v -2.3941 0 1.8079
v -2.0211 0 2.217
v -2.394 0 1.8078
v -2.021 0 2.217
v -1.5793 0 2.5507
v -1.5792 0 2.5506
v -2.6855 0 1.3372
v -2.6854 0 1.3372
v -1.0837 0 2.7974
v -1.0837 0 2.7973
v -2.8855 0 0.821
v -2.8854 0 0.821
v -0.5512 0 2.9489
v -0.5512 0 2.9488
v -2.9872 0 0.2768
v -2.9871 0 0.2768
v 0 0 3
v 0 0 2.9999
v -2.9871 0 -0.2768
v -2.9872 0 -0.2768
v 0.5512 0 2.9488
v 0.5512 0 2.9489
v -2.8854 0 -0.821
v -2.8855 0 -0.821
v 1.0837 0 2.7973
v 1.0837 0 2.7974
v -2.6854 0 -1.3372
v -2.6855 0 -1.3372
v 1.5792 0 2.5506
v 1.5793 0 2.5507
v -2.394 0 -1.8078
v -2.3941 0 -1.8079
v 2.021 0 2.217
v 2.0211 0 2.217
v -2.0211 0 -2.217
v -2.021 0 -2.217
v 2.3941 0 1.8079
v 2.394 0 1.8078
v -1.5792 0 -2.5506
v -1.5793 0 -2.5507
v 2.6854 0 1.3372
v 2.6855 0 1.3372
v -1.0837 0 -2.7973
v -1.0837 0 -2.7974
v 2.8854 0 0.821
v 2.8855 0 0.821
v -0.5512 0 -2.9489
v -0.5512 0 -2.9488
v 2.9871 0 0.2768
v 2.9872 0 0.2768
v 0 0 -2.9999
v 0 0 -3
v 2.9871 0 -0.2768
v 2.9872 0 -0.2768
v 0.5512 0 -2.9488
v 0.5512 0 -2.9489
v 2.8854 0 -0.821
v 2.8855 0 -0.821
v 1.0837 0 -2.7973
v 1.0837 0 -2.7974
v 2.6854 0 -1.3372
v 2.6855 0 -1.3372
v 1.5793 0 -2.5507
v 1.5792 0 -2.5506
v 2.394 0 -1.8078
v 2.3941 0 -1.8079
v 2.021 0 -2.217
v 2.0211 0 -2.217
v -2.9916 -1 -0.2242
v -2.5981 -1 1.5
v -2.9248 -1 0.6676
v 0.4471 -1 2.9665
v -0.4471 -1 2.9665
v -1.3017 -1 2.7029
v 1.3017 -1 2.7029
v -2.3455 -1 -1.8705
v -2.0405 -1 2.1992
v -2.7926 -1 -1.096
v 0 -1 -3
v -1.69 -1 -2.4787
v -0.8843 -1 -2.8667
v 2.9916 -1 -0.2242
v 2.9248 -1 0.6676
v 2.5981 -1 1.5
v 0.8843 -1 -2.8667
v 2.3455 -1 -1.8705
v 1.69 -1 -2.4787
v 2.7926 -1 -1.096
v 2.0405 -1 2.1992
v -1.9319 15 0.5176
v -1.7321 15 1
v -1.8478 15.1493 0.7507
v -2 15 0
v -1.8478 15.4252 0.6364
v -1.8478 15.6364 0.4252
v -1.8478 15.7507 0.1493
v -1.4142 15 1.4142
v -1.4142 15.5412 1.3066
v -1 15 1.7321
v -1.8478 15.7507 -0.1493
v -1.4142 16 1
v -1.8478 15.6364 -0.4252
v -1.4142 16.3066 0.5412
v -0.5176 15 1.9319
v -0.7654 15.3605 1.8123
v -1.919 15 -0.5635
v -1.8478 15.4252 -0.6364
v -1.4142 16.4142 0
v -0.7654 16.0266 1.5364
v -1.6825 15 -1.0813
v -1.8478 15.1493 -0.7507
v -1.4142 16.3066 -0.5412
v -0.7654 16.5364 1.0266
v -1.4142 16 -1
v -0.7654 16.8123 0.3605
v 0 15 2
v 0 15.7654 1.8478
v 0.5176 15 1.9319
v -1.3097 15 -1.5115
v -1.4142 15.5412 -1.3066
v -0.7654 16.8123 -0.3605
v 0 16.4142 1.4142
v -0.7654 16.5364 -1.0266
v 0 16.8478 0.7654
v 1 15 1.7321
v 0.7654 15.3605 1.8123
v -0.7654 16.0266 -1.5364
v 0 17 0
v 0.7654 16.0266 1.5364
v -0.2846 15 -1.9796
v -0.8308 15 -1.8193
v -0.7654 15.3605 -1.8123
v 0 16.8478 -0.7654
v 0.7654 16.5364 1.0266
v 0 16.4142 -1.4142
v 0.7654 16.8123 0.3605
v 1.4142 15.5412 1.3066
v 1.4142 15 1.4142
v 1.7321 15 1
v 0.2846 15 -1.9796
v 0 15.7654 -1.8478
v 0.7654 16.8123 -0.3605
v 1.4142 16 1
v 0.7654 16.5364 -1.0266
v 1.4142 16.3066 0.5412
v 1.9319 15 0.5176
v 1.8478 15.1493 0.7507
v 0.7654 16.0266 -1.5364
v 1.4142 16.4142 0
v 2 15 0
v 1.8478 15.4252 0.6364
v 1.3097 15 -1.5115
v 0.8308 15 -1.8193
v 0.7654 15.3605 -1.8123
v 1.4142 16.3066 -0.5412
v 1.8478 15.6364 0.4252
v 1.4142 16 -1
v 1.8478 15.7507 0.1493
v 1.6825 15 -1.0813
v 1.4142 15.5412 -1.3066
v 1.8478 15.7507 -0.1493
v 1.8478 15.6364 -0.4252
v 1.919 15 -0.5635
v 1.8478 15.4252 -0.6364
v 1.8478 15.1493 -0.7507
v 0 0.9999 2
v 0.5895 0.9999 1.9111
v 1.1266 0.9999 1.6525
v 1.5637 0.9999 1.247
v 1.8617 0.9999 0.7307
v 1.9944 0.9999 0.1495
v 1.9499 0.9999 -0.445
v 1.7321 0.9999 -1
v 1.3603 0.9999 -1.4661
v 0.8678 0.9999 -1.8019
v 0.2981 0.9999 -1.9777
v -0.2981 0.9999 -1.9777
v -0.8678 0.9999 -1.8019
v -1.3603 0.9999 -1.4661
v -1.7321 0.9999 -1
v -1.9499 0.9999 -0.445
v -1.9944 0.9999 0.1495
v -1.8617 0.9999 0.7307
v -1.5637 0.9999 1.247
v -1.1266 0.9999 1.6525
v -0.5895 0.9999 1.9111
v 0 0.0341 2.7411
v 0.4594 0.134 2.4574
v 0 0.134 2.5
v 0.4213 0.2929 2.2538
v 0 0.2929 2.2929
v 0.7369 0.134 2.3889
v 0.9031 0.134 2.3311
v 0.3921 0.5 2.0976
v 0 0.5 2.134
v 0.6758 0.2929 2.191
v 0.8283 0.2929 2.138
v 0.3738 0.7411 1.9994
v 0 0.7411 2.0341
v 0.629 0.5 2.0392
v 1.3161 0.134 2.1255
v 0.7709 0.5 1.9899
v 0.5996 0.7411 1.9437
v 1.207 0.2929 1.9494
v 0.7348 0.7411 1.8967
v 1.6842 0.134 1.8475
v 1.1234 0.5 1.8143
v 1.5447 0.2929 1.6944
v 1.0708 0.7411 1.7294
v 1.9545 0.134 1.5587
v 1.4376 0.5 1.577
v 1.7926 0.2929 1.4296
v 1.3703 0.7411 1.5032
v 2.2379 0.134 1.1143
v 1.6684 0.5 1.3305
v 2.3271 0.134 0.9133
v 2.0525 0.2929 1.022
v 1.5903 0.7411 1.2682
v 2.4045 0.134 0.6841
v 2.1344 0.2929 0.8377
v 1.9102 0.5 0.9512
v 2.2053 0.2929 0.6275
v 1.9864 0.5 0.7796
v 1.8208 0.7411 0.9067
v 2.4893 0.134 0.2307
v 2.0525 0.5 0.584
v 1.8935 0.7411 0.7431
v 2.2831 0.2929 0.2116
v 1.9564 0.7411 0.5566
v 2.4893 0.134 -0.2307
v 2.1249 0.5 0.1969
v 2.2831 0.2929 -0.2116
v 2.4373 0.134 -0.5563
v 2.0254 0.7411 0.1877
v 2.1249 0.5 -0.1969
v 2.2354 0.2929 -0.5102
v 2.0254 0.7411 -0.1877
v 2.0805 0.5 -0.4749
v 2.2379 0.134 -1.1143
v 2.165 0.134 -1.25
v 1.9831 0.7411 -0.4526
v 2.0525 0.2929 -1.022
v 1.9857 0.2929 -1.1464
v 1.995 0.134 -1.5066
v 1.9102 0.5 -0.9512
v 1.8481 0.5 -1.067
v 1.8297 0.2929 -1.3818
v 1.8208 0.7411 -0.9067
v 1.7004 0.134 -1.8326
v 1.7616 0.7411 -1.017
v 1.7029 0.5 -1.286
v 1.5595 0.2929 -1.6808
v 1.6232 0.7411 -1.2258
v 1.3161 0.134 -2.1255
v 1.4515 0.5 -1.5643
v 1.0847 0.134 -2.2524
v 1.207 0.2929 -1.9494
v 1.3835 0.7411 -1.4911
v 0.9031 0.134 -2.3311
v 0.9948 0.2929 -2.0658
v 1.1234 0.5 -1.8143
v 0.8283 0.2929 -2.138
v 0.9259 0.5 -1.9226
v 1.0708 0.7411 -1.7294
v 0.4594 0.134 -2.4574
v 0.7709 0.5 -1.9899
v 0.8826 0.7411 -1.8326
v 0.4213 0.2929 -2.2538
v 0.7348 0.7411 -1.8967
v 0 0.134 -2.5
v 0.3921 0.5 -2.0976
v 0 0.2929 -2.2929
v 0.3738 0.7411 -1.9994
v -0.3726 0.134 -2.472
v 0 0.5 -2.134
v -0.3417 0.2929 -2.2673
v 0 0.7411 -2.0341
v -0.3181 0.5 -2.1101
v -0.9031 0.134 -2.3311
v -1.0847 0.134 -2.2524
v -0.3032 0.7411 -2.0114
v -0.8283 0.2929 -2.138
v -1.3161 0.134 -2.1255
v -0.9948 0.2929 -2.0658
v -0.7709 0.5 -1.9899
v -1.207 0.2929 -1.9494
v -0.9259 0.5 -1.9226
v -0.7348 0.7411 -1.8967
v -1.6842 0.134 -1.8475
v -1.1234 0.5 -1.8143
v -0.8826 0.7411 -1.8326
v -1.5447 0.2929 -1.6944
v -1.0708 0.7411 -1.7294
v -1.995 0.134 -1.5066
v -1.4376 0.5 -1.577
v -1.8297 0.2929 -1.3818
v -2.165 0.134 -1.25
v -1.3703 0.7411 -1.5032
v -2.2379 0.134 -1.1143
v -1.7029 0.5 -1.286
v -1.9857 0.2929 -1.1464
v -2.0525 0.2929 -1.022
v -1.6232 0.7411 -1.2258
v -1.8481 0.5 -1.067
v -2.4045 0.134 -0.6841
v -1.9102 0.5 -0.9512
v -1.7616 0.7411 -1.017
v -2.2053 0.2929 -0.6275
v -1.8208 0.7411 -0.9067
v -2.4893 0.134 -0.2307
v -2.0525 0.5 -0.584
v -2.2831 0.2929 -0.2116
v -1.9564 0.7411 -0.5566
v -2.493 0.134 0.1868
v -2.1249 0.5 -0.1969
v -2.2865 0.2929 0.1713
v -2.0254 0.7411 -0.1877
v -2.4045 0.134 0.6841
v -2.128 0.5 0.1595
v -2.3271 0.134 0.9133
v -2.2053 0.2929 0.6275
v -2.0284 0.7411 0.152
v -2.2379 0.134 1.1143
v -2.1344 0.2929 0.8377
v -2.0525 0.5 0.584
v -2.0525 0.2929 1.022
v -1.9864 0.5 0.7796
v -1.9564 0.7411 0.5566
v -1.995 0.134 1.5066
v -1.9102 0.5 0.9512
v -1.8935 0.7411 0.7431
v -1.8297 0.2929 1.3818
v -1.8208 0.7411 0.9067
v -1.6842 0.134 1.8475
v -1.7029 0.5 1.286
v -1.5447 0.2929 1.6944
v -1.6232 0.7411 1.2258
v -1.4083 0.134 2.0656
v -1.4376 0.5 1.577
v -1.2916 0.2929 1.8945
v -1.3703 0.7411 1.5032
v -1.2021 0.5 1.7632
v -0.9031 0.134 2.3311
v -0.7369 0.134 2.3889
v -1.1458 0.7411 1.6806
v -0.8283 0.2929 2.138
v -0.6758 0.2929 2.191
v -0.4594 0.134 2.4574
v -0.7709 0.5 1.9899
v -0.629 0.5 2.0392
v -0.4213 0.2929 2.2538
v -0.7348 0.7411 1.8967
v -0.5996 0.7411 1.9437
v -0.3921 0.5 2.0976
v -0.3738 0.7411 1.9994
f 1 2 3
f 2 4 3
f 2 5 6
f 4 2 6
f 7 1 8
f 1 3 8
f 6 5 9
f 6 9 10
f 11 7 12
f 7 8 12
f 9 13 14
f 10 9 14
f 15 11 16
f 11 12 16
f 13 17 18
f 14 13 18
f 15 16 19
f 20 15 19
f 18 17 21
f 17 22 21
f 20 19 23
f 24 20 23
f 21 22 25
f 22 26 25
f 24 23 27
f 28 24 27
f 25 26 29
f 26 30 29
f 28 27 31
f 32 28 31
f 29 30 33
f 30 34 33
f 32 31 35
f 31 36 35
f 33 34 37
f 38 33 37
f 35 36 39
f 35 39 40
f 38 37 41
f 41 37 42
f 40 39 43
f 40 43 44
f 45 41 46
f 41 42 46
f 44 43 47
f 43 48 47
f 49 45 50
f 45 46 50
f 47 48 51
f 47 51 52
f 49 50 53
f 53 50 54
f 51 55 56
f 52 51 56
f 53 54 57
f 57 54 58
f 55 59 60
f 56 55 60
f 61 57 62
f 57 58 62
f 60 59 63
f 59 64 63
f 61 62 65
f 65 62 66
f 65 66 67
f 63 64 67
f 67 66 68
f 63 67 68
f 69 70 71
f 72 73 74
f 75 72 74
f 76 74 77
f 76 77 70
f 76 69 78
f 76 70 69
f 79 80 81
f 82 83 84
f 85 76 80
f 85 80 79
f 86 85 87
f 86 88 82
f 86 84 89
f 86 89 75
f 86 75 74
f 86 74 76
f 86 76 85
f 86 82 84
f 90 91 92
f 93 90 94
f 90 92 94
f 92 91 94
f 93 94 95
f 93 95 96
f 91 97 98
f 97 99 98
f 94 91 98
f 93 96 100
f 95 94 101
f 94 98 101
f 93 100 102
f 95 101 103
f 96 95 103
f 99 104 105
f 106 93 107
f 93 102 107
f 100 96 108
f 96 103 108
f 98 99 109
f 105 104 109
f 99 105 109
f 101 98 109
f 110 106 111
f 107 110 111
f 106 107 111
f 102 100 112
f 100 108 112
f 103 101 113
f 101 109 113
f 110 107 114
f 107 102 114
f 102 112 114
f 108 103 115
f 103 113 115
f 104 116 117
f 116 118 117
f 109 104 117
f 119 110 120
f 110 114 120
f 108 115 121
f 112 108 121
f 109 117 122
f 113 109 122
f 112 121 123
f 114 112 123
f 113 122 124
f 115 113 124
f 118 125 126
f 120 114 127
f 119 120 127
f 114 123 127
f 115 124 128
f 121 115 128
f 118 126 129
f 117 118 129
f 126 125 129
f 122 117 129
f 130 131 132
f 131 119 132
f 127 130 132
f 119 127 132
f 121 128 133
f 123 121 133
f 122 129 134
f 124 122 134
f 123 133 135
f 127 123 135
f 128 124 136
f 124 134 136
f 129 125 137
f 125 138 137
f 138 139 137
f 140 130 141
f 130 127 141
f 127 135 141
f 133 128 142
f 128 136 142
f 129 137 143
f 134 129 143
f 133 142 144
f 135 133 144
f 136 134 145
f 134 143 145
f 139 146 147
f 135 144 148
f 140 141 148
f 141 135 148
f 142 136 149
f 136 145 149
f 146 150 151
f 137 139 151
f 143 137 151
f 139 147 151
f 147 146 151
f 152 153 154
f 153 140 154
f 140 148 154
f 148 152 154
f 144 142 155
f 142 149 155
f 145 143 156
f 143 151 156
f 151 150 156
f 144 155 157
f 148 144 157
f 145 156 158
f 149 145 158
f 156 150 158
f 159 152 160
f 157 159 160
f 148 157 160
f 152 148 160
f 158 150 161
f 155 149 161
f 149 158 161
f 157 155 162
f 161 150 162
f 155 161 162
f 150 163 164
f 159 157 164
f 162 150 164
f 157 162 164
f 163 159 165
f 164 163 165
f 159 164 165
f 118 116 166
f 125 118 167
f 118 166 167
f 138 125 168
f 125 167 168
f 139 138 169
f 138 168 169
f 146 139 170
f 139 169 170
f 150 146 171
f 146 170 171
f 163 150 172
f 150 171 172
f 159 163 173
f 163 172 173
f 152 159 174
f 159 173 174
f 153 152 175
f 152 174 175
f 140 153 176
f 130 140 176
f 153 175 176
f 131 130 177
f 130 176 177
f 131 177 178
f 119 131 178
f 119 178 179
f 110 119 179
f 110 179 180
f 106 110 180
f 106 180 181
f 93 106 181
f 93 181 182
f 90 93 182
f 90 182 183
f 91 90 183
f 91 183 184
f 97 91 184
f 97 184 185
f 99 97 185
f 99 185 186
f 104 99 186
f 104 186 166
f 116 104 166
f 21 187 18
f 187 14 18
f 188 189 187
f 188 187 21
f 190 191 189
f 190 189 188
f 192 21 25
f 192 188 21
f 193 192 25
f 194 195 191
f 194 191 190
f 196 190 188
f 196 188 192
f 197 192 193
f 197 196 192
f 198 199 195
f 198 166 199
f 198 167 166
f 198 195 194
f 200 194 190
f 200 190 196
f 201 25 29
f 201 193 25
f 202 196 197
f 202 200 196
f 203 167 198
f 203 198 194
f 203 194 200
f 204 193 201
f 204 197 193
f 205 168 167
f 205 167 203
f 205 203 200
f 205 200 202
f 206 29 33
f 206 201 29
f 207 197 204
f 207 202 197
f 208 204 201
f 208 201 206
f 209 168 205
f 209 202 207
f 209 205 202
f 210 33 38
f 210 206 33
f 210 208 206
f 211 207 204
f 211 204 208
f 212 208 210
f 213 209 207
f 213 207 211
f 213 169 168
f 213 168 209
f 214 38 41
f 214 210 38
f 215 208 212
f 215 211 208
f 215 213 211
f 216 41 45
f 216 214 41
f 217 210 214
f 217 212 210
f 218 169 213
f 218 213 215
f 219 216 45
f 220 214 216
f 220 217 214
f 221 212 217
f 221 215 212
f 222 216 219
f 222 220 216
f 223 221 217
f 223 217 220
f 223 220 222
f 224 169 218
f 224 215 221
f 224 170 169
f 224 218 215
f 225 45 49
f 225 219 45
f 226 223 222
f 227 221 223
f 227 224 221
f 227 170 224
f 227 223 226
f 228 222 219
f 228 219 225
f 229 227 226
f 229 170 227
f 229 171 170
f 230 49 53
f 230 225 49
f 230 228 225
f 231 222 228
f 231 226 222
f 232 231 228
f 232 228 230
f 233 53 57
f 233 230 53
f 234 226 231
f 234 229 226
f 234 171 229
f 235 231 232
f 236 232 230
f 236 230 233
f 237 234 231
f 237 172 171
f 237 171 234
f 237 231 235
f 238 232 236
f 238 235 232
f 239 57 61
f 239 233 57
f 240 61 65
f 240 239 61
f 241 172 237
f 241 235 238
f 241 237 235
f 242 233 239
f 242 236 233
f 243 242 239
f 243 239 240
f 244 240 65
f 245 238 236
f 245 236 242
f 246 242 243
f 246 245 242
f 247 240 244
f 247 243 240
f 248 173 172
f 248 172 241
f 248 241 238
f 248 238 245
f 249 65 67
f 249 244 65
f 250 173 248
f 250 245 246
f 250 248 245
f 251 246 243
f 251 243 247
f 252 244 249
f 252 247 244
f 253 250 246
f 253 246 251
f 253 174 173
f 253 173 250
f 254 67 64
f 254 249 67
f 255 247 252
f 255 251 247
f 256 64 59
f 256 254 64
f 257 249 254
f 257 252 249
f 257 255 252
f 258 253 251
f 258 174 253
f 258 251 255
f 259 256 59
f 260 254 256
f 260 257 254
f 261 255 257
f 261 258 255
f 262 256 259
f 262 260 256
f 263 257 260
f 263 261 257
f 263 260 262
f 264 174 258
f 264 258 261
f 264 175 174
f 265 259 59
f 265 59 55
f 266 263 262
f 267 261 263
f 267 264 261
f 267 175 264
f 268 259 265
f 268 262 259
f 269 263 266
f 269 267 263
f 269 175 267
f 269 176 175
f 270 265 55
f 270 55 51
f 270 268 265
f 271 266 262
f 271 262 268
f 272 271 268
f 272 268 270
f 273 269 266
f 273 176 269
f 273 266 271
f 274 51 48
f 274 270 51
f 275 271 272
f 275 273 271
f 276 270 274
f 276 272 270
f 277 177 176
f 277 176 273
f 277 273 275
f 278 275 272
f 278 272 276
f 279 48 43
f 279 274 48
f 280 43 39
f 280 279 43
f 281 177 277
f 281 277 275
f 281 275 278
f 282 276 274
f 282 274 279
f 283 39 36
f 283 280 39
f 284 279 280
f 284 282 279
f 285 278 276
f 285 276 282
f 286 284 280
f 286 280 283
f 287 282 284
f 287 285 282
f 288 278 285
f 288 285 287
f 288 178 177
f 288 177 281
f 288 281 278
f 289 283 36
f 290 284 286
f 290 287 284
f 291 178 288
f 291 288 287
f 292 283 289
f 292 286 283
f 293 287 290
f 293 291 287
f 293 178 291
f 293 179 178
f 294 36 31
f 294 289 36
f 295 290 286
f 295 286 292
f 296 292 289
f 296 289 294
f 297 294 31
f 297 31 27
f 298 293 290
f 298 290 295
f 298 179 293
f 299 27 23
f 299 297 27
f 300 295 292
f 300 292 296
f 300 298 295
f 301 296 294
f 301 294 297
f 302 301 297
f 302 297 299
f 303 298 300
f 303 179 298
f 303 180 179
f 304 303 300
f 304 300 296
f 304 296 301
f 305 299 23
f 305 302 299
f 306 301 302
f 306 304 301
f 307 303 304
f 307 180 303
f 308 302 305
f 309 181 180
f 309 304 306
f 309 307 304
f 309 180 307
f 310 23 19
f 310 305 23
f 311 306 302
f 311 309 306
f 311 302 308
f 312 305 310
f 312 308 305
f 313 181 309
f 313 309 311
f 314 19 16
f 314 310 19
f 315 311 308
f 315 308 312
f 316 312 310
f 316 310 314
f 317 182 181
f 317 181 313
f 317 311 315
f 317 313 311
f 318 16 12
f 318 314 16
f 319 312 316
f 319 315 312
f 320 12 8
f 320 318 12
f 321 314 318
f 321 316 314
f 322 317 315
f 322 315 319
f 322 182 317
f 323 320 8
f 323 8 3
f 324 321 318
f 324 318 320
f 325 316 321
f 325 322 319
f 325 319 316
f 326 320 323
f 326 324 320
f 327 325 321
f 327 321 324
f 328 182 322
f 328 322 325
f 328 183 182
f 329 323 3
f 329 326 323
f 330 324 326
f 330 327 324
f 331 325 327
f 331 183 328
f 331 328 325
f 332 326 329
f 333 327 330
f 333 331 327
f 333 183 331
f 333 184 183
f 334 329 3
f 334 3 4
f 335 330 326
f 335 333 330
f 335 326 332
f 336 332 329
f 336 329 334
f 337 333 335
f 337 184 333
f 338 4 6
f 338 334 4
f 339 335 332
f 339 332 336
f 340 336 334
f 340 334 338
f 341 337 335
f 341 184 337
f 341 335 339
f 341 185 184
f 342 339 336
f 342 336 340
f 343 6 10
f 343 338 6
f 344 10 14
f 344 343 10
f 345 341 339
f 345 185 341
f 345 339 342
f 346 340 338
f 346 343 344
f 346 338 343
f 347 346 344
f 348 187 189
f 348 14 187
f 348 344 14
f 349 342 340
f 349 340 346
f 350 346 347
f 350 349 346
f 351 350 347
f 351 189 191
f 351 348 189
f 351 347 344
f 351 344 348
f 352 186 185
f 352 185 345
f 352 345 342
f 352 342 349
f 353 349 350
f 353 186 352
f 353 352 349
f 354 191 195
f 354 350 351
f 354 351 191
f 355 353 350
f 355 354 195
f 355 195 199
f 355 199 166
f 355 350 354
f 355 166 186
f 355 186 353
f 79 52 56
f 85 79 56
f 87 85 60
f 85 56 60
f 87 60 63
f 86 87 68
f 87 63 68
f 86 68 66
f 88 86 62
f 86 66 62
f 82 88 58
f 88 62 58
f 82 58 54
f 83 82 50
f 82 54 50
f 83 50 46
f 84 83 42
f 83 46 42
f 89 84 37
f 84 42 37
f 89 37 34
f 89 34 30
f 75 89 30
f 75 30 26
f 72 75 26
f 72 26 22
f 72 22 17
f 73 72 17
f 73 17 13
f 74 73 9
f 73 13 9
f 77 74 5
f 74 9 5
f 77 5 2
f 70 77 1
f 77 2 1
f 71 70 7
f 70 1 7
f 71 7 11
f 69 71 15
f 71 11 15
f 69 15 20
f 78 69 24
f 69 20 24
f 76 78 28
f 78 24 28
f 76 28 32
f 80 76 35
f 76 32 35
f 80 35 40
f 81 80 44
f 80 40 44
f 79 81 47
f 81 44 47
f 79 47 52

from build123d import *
from build123d.topology import SkipClean

# Parameters (mm, degrees)
SKETCH1_R           = 2
BOSS_EXTRUDE1_DEPTH = 15
SKETCH3_R           = 3
BOSS_EXTRUDE2_DEPTH = 1
FILLET3_R           = 1


with BuildPart() as part:
    # Sketch1 → Boss-Extrude1 (new body)
    with BuildSketch(Plane(origin=(0, 0, 0), x_dir=(1, 0, 0), z_dir=(0, 1, 0))):
        with Locations(Location((0, 0, 0), (0, 0, 270))):
            Circle(SKETCH1_R)
    extrude(amount=BOSS_EXTRUDE1_DEPTH)

    # Sketch2 → Revolve1 (revolve)
    with SkipClean():  # the faces are left unmerged after this step: merging them gives an invalid solid
        with BuildSketch(Plane.XY):
            with BuildLine():
                Line((2, 15), (-2, 15))
                ThreePointArc((-2, 15), (0, 17), (2, 15))
            make_face()
        revolve(axis=Axis((2, 15, 0), (-1, 0, 0)))

    # Sketch3 → Boss-Extrude2 (add)
    with BuildSketch(Plane.XZ):
        with Locations(Location((0, 0, 0), (0, 0, 270))):
            Circle(SKETCH3_R)
    extrude(amount=BOSS_EXTRUDE2_DEPTH)

    # Fillet3
    fillet3_edges = [part.edges().sort_by_distance(p)[0] for p in [
        (0, 0, -2),
    ]]
    fillet(fillet3_edges, radius=FILLET3_R - 0.0001)  # a hair under: the kernel refuses the full size


solid = part.part
